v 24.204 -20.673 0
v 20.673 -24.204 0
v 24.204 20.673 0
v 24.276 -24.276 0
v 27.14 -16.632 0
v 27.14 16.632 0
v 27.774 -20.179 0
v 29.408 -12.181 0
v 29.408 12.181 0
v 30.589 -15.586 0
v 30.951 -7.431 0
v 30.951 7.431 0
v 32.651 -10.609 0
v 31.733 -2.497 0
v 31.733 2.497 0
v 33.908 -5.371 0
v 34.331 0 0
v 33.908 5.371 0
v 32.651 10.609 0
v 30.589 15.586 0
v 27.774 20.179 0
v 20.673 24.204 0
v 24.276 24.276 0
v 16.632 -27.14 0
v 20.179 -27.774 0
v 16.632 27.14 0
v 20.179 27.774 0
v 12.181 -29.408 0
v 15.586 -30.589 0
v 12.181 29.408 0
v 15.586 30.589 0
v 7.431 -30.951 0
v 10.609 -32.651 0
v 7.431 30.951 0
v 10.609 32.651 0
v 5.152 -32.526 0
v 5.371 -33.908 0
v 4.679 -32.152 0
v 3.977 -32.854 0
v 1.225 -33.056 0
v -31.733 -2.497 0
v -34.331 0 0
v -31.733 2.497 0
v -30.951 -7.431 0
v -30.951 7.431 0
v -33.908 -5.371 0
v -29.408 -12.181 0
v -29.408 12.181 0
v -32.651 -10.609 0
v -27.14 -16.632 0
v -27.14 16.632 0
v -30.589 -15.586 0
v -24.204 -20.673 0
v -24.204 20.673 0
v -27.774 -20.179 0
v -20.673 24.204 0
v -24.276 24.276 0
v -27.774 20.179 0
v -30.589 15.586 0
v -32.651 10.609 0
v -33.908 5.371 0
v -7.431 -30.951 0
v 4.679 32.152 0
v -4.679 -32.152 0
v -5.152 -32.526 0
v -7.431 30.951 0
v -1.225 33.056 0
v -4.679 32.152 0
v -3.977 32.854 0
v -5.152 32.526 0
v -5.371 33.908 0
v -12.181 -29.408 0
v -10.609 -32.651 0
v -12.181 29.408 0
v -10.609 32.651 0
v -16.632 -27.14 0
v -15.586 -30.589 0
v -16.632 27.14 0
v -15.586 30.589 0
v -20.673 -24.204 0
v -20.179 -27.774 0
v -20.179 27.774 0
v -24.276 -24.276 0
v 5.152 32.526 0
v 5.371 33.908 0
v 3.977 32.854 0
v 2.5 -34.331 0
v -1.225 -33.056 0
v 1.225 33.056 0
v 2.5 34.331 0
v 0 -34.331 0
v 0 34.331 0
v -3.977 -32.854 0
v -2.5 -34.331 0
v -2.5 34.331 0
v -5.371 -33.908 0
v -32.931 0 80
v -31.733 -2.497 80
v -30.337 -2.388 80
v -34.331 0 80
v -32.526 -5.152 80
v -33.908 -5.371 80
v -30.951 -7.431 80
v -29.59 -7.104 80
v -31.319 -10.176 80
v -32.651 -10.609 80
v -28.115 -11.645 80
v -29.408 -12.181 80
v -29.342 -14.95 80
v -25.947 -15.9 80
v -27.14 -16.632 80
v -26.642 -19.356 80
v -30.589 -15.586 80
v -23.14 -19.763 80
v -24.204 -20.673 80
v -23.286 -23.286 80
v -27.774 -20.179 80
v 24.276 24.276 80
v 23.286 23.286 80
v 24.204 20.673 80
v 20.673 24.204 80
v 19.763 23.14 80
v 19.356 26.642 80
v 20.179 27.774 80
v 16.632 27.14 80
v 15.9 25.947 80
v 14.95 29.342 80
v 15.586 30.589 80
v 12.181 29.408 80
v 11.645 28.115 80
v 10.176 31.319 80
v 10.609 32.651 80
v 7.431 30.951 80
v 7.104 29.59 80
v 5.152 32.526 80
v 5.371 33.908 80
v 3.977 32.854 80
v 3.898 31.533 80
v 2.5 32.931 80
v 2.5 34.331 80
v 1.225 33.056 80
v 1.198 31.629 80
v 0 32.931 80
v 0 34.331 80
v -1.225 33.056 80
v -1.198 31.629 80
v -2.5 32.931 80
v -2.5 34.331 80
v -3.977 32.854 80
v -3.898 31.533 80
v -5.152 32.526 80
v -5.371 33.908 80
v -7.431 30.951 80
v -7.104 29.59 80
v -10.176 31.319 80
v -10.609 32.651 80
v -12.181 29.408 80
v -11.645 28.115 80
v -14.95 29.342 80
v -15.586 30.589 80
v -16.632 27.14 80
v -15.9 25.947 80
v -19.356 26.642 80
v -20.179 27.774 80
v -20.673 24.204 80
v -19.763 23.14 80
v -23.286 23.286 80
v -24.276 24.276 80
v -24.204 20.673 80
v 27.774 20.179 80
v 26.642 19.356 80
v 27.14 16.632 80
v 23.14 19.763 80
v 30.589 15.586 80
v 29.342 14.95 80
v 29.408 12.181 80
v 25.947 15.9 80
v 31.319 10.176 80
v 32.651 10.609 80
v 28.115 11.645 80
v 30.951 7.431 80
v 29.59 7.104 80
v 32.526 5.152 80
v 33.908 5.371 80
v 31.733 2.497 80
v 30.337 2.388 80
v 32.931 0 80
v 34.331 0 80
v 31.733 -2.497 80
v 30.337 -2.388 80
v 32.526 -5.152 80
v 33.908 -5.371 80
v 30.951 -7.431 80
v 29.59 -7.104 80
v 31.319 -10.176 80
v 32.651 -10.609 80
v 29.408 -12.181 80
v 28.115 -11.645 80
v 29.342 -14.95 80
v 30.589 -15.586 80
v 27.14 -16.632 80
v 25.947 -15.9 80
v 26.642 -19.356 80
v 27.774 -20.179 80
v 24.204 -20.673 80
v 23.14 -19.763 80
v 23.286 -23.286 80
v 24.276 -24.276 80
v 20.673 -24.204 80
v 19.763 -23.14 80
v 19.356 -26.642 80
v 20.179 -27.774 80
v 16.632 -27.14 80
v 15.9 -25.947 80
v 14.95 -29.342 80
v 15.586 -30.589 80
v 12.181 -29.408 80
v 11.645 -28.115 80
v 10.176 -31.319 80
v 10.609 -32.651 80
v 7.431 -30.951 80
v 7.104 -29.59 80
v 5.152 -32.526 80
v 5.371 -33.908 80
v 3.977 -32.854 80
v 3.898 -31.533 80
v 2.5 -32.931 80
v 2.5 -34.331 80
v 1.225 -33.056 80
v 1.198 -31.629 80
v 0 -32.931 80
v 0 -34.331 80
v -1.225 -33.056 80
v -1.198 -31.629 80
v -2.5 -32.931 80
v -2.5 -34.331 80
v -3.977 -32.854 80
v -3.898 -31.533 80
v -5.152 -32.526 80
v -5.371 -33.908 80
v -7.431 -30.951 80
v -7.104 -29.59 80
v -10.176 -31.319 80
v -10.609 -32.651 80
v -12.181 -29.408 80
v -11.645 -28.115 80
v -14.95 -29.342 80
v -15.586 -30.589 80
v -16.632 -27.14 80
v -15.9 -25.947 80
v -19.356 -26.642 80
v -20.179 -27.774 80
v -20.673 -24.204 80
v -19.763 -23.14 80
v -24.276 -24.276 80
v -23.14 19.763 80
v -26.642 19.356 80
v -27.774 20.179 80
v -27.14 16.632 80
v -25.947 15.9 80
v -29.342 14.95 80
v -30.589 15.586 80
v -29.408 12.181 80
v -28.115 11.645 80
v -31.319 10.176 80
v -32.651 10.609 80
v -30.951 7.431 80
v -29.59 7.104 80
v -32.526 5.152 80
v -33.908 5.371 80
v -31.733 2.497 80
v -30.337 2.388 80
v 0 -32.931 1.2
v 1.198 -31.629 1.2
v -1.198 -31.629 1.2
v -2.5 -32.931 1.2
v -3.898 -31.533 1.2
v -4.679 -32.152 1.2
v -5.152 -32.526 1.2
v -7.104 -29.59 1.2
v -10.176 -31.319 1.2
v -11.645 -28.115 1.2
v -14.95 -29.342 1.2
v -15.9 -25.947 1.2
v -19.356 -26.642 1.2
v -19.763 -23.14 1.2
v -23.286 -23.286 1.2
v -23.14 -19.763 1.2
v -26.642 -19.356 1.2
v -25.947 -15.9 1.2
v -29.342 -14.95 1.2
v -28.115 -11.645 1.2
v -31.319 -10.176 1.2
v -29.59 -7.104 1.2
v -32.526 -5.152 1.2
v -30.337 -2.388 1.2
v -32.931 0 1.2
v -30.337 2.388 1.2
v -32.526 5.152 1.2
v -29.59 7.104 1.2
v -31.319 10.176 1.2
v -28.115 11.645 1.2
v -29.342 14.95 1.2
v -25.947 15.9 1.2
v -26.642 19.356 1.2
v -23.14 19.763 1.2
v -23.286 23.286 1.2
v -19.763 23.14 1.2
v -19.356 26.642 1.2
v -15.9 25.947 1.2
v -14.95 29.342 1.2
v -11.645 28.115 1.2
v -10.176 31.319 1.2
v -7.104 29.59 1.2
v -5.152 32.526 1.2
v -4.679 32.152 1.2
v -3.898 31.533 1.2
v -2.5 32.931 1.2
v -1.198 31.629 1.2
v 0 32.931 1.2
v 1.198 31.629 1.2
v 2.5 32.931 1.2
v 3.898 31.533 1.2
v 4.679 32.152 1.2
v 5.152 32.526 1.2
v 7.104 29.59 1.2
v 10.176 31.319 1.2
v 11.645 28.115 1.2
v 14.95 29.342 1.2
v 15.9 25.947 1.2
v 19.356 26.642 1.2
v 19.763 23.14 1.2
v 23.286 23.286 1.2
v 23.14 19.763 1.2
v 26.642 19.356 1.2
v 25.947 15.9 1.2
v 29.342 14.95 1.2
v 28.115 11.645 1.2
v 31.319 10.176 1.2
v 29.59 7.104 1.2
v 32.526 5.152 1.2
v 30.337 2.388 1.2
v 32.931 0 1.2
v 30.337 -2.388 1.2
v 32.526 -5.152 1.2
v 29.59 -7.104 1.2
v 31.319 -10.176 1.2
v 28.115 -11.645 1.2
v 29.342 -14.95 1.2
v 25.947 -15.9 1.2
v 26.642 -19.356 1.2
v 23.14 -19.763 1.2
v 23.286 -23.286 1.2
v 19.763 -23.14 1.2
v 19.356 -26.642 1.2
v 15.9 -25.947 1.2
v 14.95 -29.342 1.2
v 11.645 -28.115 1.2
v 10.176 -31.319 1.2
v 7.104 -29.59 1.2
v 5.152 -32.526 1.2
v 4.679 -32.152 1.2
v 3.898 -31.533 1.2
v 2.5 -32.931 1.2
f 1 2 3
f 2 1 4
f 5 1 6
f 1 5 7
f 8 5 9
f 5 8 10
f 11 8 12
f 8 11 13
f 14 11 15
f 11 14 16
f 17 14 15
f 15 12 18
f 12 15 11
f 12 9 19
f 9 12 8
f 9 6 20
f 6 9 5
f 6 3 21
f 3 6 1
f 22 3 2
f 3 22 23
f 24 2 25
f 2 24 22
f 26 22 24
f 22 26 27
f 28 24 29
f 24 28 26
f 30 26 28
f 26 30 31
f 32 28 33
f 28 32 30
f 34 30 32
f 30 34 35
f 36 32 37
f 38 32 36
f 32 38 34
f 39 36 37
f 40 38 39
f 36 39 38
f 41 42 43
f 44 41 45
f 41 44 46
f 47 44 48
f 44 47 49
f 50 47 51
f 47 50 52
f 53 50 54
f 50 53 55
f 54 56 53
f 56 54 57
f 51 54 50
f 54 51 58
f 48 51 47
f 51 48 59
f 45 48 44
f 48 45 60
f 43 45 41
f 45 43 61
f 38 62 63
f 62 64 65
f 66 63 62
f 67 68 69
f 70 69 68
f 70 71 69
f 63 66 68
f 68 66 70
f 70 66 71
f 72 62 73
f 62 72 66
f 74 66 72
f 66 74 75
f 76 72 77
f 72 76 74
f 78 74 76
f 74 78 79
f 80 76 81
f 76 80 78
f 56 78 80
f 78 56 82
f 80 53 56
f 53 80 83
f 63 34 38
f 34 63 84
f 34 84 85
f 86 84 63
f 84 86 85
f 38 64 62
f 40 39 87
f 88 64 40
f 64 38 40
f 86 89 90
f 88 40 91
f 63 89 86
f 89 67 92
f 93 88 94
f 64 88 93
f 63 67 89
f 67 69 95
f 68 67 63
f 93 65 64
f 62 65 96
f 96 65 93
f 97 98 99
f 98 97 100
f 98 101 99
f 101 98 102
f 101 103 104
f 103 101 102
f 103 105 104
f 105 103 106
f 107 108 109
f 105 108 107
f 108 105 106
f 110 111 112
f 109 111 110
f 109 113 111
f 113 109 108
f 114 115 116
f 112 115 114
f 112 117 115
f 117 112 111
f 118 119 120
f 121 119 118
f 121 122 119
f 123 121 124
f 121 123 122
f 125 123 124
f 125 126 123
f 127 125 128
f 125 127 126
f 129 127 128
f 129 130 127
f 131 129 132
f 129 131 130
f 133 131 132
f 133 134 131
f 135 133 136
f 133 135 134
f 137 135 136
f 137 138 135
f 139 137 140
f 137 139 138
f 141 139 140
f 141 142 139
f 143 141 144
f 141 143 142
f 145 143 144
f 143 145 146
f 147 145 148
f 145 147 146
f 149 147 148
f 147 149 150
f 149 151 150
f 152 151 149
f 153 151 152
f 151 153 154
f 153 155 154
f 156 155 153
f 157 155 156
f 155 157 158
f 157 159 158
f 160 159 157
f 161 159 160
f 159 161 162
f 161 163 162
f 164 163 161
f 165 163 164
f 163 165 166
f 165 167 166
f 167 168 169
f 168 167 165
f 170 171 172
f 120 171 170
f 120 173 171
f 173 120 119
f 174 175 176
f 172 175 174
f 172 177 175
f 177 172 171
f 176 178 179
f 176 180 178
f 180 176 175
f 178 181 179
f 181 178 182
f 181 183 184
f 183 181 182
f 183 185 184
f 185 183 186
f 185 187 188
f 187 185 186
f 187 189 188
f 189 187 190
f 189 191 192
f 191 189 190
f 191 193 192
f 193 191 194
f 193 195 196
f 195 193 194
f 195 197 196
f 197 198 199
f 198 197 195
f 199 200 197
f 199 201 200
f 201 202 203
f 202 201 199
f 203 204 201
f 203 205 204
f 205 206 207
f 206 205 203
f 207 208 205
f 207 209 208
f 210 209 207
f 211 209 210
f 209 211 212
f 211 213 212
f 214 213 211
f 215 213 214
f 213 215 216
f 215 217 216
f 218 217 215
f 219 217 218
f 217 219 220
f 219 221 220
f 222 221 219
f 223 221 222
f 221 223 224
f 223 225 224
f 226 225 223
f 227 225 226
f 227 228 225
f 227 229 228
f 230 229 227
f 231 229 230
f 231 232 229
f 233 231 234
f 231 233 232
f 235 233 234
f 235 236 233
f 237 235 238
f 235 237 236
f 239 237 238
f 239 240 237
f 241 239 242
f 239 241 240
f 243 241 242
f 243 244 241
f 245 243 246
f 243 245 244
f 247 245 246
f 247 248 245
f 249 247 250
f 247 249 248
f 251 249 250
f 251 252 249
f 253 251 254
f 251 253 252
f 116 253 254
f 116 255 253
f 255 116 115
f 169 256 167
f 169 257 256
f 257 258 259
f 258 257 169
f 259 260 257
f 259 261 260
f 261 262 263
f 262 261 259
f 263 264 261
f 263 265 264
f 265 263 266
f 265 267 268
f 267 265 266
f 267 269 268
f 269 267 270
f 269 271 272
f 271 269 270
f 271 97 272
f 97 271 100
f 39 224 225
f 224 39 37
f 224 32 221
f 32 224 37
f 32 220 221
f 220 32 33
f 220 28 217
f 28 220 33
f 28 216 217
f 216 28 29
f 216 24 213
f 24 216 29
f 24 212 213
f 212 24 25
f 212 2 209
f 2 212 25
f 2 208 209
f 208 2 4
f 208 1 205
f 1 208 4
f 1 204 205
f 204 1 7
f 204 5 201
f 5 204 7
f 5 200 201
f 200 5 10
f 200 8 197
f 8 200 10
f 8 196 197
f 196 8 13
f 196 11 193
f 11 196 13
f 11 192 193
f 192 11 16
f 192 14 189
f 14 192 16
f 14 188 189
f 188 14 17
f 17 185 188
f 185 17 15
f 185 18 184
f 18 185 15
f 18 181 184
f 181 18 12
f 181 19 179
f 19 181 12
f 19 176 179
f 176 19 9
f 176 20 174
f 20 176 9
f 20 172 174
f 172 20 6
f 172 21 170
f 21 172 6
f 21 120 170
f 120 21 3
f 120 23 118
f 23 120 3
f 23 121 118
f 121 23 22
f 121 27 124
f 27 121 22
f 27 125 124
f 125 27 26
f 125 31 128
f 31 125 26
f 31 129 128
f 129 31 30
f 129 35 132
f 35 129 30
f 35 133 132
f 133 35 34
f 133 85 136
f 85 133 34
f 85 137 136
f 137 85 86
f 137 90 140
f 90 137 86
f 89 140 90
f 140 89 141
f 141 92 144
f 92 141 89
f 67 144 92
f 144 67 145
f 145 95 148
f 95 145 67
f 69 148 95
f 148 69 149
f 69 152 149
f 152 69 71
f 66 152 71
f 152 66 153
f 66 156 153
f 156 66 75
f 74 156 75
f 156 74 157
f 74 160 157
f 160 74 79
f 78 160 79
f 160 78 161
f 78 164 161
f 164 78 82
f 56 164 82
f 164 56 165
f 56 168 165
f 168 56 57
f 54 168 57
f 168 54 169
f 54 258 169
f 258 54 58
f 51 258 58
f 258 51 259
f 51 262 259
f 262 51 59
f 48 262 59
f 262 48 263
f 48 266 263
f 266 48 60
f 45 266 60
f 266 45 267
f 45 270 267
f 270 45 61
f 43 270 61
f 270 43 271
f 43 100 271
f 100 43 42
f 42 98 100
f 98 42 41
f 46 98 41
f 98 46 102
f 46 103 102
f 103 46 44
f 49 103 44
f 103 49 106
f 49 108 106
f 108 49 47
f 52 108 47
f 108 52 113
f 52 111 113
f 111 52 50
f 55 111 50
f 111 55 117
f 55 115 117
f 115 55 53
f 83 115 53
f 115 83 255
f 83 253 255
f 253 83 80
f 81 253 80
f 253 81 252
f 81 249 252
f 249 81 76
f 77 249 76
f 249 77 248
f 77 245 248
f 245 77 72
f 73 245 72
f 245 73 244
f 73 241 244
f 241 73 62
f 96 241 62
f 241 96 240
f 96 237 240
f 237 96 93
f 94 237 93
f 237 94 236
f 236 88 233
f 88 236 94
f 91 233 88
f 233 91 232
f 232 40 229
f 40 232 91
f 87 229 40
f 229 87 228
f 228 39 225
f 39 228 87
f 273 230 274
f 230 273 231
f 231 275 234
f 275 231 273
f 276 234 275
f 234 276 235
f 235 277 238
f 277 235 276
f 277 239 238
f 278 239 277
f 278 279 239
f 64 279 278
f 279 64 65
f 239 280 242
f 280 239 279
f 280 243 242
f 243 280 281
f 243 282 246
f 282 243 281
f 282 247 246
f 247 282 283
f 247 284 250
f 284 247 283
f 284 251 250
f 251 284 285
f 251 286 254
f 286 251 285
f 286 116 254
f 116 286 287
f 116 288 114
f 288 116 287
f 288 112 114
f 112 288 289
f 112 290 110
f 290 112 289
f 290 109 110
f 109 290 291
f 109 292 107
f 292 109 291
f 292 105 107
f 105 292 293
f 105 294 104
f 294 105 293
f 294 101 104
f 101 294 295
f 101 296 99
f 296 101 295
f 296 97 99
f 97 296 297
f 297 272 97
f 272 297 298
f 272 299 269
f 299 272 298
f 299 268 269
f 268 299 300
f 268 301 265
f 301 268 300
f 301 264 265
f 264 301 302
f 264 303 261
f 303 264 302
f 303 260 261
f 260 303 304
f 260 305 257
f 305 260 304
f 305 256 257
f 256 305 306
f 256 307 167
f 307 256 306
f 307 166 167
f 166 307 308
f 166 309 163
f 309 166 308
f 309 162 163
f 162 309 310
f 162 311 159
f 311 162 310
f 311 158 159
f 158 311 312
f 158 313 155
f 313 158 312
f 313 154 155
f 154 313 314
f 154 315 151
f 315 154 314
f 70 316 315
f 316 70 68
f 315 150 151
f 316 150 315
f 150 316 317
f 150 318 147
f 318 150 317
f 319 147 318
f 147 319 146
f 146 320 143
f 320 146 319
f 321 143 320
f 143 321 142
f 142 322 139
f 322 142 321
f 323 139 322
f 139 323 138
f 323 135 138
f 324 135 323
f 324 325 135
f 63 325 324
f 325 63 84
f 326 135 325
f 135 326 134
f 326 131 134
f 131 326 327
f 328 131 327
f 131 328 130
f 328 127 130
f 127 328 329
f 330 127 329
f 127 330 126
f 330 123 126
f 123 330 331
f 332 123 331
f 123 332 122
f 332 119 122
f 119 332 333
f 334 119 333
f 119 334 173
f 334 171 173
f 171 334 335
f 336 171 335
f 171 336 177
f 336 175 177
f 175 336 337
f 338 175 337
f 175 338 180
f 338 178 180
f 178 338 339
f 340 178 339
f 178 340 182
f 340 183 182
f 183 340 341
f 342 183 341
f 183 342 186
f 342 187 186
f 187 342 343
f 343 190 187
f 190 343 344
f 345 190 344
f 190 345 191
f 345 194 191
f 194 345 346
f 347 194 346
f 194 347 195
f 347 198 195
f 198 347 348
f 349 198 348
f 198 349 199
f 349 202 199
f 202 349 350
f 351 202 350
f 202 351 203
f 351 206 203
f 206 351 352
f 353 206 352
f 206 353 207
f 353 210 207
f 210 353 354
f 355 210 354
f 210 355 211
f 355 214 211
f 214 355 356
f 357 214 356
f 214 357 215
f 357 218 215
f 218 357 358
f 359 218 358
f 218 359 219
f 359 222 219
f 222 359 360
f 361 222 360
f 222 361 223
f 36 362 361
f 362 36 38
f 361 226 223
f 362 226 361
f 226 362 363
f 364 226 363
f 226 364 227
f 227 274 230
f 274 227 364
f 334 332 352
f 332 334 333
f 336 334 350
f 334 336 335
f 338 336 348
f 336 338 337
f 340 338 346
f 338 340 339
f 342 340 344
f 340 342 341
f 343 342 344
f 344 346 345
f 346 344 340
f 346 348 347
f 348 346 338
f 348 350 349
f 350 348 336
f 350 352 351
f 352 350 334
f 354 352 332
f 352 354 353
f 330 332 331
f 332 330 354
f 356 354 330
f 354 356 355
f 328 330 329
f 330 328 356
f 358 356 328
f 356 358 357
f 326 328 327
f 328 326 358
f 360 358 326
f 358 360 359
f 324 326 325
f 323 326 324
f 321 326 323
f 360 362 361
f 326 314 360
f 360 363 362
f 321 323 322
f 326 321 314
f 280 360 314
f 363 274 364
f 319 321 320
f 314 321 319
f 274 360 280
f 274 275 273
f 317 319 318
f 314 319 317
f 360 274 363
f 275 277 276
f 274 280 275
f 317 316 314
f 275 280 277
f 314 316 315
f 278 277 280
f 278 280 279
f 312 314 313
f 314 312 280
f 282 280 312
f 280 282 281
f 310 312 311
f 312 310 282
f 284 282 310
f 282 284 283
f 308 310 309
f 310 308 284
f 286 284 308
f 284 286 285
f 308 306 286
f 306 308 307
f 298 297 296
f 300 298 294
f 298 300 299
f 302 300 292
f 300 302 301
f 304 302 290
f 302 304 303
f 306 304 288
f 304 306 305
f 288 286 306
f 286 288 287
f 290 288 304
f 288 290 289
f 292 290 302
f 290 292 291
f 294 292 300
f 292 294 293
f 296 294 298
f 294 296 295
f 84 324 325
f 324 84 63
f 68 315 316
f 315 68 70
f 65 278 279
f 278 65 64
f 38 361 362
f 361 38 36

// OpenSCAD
// file: lib/arc.scad
radius = 20;
angles = [10, 90];
width = 2;
fn = 24; 

module sector(radius, angles, fn = 24) {
    r = radius / cos(180 / fn);
    step = -360 / fn; 

    points = concat([[0, 0]],
        [for(a = [angles[0] : step : angles[1] - 360]) 
            [r * cos(a), r * sin(a)]
        ],
        [[r * cos(angles[1]), r * sin(angles[1])]]
    );

    difference() {
        circle(radius, $fn = fn);
        polygon(points);
    }
}

module arc(radius, angles, width = 1, fn = 24) {
    difference() {
        sector(radius + width, angles, fn);
        sector(radius, angles, fn);
    }
} 

module arc_demo(){
  sector(15, [0,30]);

  translate([20,0,0])
  arc(10, [0,45], 1.2, 24);
}
// main file
include <lib/arc.scad>

caixa();
//tampa();

na = 40;


//r = 58.91;
//r = 40;
//r = 30;
//r = 20.4;
//r = 12.0;

w=2.5;
h = 2.5;
n = 0;

r = radius(w, na);


//hs = 0.9;
hs = 1.4;

nd = w*n;

hh = 80;
bh = 1.2;

ts = 0;


function radius(w, na) = 
  w * na / PI;

module a(r, d = 0) {

ang = 90;
aa = (360*w*2)/(2*PI*r);


for(i = [0:na]) {
  iaa = i * aa;
  ad = aa/2;
  rd = r - d;

polygon([[0,0],
[rd*cos(iaa - ad), rd*sin(iaa - ad)],
[(rd + h) *cos(i * aa), (rd + h)*sin(i * aa)],
[rd*cos(iaa + ad), rd*sin(iaa + ad)]]
);
}
}

module b(r, n){
  translate([w,0,0])
 for(i = [0:n]) {
   dx = i * w*2;
polygon([[dx-w,0],
[dx-w, r],
[dx, r + h],
[dx+w, r],
[dx + w*2,0]]
);
} 
}

module m4(){
    children();
    mirror([0,1,0])
    children();
    
    mirror([1,0,0]) {
      children();
      mirror([0,1,0])
      children();
    }
    
}


module wall(r, hs){
difference(){
m4(){
b(r, n);
translate([n*w*2,0,0])
a(r);
}

m4(){
b(r-hs, n);
translate([n*w*2,0,0])
a(r, hs);
}
}
}

module caixa() {

linear_extrude(hh)
wall(r, hs);
/*
translate([0,0,hh - 6])
#linear_extrude(2)
wall(r, 3);
*/

linear_extrude(bh)
m4(){
b(r, n);
translate([n*w*2,0,0])
a(r, hs);
}
}


module tampa(){


h = 10;
difference(){
union(){
translate([0,0,hh-bh*2])
linear_extrude(bh*2)
tp(ts);

translate([0,0,hh])
linear_extrude(bh)
tp(-4);
}

union(){
translate([0,0,hh-bh*2])
linear_extrude(3*bh -1)
tp(ts + 2);

translate([0,0,hh+bh])
cube([60,7,h], center=true);
}
}

}



module tp(ts){
m4(){
tb(r-ts, n);
translate([n*w*2 - ts/2,0,0])
ta(r-ts);
}
}

module ta(r){
    sector(r, [0,90], fn=48);
}

module tb(r, n){
    square([r + w, r]);
}
